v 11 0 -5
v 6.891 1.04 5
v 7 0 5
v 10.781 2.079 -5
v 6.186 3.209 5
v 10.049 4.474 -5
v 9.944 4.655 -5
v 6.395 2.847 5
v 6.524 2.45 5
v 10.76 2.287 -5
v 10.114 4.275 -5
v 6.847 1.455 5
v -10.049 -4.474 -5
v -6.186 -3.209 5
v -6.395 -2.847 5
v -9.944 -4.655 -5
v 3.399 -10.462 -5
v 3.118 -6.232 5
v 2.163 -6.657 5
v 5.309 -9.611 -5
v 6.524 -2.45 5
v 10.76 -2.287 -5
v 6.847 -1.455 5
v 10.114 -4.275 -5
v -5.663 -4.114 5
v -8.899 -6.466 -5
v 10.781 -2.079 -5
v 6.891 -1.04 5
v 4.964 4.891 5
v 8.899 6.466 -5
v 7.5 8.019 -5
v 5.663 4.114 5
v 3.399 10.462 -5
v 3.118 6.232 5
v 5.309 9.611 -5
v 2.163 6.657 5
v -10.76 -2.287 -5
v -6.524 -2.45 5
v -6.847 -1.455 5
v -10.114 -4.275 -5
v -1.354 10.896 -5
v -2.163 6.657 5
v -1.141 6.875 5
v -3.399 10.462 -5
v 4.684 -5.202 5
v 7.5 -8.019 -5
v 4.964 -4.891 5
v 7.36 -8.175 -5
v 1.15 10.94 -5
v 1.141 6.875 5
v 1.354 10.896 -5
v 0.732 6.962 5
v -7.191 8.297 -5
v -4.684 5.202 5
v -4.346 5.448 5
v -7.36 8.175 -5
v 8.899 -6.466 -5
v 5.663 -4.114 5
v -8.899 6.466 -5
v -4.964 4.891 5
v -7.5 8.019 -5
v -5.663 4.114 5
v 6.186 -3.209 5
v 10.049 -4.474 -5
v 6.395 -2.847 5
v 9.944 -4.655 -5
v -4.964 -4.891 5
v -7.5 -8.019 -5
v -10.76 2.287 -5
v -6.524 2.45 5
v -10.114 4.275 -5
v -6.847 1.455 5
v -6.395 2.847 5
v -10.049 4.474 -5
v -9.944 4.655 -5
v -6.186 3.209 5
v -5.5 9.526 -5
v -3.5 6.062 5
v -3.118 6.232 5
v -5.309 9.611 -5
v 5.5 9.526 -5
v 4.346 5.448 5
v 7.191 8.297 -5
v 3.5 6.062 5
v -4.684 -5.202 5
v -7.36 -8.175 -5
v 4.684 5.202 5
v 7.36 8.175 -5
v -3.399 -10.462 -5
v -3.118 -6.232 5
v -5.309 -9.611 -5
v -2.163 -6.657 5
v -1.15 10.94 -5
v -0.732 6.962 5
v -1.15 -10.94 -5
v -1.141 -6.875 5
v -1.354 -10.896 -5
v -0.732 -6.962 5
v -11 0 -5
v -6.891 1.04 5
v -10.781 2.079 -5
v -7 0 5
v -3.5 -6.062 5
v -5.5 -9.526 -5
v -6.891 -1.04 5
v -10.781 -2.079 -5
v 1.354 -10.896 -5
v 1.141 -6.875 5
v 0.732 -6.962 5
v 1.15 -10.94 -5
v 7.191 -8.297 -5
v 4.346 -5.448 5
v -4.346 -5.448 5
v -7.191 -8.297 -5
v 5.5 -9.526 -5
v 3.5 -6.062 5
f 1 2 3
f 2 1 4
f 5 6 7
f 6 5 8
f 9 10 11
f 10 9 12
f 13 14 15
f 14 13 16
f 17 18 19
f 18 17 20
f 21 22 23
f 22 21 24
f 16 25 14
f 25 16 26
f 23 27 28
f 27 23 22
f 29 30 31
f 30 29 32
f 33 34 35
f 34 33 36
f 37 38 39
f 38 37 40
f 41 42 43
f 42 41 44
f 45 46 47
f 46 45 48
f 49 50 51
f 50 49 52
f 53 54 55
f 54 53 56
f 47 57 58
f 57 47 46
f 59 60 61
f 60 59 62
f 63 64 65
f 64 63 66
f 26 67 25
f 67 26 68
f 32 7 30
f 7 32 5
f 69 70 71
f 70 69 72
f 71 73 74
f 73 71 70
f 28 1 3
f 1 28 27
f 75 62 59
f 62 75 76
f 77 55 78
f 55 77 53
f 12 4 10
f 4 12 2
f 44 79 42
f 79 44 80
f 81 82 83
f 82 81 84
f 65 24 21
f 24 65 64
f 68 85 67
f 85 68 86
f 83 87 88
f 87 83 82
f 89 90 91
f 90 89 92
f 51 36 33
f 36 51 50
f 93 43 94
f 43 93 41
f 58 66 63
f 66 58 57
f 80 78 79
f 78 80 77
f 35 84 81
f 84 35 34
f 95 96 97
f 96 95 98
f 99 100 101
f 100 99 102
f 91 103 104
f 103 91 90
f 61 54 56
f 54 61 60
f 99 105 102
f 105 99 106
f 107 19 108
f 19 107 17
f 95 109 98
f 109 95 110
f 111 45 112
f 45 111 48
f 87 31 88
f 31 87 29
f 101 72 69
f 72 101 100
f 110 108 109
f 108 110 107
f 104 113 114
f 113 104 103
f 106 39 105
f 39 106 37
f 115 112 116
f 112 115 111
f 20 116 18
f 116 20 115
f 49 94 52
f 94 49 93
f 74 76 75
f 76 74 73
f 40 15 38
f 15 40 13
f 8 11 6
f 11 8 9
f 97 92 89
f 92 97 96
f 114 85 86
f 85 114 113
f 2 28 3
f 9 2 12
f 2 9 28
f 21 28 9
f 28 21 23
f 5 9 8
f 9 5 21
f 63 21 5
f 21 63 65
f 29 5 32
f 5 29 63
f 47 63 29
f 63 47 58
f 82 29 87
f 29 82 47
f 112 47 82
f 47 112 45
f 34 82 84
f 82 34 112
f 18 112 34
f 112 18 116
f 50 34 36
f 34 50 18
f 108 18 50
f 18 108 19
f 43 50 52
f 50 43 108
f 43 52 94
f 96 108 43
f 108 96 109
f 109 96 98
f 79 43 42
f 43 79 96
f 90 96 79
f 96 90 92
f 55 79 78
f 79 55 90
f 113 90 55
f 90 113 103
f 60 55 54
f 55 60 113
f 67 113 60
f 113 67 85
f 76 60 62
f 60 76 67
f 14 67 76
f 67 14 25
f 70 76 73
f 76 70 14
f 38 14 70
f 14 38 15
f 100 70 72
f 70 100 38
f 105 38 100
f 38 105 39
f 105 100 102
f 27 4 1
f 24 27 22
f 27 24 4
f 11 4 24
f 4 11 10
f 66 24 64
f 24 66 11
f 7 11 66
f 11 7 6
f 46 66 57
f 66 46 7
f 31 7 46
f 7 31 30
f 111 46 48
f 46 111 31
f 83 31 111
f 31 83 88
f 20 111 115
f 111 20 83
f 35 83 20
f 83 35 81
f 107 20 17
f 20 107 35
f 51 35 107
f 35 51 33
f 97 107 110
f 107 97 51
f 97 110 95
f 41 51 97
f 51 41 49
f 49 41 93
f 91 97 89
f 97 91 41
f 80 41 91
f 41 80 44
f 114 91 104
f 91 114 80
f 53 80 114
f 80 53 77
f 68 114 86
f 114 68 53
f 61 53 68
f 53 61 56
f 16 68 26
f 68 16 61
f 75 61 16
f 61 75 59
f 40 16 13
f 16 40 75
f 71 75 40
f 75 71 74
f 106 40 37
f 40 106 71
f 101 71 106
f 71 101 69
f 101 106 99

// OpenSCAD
color ("black") 
	intersection() {
		cylinder(h=30, r1=15,r2=3,center=true);
		cylinder(h=10, r=15,center=true);
}
